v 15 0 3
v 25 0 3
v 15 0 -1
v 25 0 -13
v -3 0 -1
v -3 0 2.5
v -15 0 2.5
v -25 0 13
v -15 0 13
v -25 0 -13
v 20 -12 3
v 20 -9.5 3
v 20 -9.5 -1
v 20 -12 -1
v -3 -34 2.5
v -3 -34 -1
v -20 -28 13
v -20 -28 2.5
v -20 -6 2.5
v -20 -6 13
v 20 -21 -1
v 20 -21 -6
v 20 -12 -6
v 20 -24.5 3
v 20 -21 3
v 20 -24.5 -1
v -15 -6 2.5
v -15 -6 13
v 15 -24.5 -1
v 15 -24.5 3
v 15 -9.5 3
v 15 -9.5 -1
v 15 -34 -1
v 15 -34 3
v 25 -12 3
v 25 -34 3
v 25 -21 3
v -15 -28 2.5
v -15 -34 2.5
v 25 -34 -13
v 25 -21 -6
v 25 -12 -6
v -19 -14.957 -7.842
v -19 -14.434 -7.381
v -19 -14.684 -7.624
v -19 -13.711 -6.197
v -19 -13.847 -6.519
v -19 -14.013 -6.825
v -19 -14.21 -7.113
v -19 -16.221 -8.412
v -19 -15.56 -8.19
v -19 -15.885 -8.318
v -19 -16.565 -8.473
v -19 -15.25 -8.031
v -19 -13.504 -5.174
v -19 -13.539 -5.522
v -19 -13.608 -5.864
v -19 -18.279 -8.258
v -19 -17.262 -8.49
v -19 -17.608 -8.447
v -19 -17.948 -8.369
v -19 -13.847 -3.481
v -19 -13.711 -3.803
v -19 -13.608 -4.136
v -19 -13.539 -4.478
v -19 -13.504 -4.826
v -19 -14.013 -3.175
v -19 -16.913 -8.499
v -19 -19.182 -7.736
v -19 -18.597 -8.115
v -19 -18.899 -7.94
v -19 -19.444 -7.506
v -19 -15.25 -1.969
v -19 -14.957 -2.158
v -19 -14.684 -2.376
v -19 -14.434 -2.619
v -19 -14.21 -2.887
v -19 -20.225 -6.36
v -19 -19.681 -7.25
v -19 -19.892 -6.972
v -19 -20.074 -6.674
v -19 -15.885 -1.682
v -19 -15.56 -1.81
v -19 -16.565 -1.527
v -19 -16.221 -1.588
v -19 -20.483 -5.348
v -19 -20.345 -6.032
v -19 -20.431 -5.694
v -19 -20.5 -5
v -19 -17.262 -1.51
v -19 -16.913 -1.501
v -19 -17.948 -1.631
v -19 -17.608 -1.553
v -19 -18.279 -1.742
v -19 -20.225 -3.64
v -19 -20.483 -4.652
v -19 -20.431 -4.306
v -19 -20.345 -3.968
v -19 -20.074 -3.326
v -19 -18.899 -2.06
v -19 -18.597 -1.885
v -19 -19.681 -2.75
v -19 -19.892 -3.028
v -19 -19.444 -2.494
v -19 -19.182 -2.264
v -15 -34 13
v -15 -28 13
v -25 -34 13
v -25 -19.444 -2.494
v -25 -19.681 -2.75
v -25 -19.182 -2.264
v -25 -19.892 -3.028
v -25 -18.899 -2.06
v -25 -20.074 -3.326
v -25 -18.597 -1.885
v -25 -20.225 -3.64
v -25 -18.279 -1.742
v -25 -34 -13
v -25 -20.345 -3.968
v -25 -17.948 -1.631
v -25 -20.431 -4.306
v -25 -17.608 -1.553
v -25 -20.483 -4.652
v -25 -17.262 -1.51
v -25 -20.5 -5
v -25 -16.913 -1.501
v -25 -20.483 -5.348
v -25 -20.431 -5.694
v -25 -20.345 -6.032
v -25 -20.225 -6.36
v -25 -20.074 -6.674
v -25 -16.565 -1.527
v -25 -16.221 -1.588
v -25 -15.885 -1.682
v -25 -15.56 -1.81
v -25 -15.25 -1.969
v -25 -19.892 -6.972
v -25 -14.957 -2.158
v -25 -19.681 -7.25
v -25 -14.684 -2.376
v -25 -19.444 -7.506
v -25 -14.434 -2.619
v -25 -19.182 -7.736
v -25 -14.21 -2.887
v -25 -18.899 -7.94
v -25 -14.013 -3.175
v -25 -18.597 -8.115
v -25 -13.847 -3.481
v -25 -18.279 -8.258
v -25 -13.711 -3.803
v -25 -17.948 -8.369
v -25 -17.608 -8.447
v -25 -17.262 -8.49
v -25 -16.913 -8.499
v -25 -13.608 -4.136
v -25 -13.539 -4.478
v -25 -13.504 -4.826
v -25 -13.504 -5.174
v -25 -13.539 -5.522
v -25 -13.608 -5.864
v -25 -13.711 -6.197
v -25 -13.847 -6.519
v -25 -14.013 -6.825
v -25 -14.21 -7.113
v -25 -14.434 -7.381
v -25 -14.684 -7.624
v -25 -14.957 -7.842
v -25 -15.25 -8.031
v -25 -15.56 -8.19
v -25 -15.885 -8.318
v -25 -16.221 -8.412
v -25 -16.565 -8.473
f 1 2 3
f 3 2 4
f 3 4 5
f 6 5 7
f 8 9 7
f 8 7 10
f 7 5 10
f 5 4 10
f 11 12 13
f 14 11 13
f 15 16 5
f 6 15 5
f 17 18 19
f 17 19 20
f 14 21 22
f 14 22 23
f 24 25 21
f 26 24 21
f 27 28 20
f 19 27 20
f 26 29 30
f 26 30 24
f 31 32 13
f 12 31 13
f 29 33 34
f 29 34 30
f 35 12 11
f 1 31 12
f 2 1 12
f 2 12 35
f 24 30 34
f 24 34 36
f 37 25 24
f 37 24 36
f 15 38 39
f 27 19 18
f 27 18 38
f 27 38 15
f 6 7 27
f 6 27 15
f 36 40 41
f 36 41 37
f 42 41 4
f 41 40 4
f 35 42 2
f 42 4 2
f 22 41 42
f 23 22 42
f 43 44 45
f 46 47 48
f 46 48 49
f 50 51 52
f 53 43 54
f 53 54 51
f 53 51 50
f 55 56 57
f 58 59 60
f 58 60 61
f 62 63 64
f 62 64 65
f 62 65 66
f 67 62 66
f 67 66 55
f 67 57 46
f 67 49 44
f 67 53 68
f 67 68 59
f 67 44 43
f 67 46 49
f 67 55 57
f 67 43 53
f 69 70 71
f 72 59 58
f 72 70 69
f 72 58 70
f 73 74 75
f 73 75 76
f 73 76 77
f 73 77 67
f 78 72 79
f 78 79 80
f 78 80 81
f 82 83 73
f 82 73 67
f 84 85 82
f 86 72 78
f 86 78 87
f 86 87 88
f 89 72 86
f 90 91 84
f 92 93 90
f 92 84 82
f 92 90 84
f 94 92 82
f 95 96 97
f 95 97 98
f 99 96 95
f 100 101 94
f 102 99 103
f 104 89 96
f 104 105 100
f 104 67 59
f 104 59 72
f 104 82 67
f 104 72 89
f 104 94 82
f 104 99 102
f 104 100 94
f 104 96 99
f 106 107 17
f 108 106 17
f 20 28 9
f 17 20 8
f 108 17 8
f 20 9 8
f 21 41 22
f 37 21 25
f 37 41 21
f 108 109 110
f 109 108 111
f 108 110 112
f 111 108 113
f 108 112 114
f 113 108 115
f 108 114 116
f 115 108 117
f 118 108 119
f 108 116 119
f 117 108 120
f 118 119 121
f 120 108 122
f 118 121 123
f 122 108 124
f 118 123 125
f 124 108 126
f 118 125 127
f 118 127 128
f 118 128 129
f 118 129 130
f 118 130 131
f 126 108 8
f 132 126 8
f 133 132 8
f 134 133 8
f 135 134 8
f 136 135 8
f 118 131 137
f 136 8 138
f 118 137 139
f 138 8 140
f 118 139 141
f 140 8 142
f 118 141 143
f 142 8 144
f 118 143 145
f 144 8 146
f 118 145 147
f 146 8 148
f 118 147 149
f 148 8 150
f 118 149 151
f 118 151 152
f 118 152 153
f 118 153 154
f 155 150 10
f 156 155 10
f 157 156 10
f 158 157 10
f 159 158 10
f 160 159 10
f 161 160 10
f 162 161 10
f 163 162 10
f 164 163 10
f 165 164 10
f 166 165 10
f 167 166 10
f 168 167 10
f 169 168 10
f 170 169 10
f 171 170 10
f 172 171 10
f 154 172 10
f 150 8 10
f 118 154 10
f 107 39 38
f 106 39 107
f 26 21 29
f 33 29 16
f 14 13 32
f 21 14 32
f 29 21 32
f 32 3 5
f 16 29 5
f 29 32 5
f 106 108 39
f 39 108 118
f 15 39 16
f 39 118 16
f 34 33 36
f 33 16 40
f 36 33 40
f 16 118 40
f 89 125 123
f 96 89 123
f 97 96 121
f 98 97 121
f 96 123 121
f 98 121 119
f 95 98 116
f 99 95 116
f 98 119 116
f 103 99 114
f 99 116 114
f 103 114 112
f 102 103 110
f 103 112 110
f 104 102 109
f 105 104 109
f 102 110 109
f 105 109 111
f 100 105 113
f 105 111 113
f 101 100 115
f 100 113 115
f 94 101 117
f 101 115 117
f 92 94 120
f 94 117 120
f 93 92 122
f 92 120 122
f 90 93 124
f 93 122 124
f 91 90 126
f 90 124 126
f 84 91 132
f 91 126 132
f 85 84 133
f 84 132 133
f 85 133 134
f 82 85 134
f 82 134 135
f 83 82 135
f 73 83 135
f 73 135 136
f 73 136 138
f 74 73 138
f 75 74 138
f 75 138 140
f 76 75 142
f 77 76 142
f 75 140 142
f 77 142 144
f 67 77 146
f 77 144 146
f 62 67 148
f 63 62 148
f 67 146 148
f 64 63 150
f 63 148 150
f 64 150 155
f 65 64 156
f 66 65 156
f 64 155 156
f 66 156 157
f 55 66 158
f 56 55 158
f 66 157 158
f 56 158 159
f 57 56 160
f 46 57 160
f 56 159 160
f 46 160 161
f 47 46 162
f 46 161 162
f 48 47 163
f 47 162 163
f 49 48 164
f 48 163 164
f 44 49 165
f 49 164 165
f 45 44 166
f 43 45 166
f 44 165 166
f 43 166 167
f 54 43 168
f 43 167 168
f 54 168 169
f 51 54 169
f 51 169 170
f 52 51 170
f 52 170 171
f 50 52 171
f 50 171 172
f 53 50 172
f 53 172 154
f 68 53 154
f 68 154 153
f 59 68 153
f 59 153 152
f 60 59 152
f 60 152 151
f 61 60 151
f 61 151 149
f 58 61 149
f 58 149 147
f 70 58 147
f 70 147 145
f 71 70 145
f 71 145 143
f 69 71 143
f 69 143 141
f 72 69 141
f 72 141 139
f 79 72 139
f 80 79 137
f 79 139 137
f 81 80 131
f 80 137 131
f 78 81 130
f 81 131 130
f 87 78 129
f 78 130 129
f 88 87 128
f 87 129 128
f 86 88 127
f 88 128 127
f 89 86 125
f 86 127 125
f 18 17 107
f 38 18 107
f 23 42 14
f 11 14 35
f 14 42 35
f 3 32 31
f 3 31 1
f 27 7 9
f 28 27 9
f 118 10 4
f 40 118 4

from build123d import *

# Parameters (mm, degrees)
F1_DEPTH  = 34
F2_W      = 9
F2_H      = 9
F3_DEPTH  = 5
F4_R      = 3.5
F5_DEPTH  = 6
F6_W      = 5
F6_H      = 9.5
F7_DEPTH  = 4
F8_W      = 20.85
F8_H      = 14
F9_DEPTH  = 34.001
F10_W     = 5
F10_H     = 14
F11_DEPTH = 6
F12_W     = 5
F12_H     = 14
F13_DEPTH = 6
F15_DEPTH = 3.5


with BuildPart() as f1:
    # F0 (on Front) → F1 (new body)
    with BuildSketch(Plane.XZ):
        Polygon((0.85, 13), (-25, 13), (-25, -13), (25, -13), (25, 3), (20, 3), (20, -1), (0.85, -1), align=None)
    extrude(amount=F1_DEPTH)

    # F2 (on face) → F3 (cut, through all)
    with BuildSketch(Plane.YZ.offset(25)):
        with Locations((-16.5, -1.5)):
            Rectangle(F2_W, F2_H)
    extrude(amount=-F3_DEPTH, mode=Mode.SUBTRACT)

    # F4 (on face) → F5 (cut)
    with BuildSketch(Plane(origin=(-25, 0, 0), x_dir=(0, -1, 0), z_dir=(-1, 0, 0))):
        with Locations((17, -5)):
            Circle(F4_R)
    extrude(amount=-F5_DEPTH, mode=Mode.SUBTRACT)

    # F6 (on face) → F7 (join, through all)
    with BuildSketch(Plane.XY.offset(-1)):
        with Locations((17.5, -29.25)):
            Rectangle(F6_W, F6_H)
        with Locations((17.5, -4.75)):
            Rectangle(F6_W, F6_H)
    extrude(amount=F7_DEPTH)

    # F8 (on face) → F9 (cut, through all)
    with BuildSketch(Plane.XZ.offset(34)):
        with Locations((-9.575, 6)):
            Rectangle(F8_W, F8_H)
    extrude(amount=-F9_DEPTH, mode=Mode.SUBTRACT)

    # F10 (on face) → F11 (join)
    with BuildSketch(Plane.XZ.offset(34)):
        with Locations((-17.5, 6)):
            Rectangle(F10_W, F10_H)
    extrude(amount=-F11_DEPTH)

    # F12 (on face) → F13 (join)
    with BuildSketch(Plane(origin=(0, 0, 0), x_dir=(-1, 0, 0), z_dir=(0, 1, 0))):
        with Locations((17.5, 6)):
            Rectangle(F12_W, F12_H)
    extrude(amount=-F13_DEPTH)

    # F14 (on face) → F15 (join)
    with BuildSketch(Plane.XY.offset(-1)):
        Polygon((-3, 0), (-15, 0), (-15, -6), (-20, -6), (-20, -28), (-15, -28), (-15, -34), (-3, -34), align=None)
    extrude(amount=F15_DEPTH)


solid = f1.part
